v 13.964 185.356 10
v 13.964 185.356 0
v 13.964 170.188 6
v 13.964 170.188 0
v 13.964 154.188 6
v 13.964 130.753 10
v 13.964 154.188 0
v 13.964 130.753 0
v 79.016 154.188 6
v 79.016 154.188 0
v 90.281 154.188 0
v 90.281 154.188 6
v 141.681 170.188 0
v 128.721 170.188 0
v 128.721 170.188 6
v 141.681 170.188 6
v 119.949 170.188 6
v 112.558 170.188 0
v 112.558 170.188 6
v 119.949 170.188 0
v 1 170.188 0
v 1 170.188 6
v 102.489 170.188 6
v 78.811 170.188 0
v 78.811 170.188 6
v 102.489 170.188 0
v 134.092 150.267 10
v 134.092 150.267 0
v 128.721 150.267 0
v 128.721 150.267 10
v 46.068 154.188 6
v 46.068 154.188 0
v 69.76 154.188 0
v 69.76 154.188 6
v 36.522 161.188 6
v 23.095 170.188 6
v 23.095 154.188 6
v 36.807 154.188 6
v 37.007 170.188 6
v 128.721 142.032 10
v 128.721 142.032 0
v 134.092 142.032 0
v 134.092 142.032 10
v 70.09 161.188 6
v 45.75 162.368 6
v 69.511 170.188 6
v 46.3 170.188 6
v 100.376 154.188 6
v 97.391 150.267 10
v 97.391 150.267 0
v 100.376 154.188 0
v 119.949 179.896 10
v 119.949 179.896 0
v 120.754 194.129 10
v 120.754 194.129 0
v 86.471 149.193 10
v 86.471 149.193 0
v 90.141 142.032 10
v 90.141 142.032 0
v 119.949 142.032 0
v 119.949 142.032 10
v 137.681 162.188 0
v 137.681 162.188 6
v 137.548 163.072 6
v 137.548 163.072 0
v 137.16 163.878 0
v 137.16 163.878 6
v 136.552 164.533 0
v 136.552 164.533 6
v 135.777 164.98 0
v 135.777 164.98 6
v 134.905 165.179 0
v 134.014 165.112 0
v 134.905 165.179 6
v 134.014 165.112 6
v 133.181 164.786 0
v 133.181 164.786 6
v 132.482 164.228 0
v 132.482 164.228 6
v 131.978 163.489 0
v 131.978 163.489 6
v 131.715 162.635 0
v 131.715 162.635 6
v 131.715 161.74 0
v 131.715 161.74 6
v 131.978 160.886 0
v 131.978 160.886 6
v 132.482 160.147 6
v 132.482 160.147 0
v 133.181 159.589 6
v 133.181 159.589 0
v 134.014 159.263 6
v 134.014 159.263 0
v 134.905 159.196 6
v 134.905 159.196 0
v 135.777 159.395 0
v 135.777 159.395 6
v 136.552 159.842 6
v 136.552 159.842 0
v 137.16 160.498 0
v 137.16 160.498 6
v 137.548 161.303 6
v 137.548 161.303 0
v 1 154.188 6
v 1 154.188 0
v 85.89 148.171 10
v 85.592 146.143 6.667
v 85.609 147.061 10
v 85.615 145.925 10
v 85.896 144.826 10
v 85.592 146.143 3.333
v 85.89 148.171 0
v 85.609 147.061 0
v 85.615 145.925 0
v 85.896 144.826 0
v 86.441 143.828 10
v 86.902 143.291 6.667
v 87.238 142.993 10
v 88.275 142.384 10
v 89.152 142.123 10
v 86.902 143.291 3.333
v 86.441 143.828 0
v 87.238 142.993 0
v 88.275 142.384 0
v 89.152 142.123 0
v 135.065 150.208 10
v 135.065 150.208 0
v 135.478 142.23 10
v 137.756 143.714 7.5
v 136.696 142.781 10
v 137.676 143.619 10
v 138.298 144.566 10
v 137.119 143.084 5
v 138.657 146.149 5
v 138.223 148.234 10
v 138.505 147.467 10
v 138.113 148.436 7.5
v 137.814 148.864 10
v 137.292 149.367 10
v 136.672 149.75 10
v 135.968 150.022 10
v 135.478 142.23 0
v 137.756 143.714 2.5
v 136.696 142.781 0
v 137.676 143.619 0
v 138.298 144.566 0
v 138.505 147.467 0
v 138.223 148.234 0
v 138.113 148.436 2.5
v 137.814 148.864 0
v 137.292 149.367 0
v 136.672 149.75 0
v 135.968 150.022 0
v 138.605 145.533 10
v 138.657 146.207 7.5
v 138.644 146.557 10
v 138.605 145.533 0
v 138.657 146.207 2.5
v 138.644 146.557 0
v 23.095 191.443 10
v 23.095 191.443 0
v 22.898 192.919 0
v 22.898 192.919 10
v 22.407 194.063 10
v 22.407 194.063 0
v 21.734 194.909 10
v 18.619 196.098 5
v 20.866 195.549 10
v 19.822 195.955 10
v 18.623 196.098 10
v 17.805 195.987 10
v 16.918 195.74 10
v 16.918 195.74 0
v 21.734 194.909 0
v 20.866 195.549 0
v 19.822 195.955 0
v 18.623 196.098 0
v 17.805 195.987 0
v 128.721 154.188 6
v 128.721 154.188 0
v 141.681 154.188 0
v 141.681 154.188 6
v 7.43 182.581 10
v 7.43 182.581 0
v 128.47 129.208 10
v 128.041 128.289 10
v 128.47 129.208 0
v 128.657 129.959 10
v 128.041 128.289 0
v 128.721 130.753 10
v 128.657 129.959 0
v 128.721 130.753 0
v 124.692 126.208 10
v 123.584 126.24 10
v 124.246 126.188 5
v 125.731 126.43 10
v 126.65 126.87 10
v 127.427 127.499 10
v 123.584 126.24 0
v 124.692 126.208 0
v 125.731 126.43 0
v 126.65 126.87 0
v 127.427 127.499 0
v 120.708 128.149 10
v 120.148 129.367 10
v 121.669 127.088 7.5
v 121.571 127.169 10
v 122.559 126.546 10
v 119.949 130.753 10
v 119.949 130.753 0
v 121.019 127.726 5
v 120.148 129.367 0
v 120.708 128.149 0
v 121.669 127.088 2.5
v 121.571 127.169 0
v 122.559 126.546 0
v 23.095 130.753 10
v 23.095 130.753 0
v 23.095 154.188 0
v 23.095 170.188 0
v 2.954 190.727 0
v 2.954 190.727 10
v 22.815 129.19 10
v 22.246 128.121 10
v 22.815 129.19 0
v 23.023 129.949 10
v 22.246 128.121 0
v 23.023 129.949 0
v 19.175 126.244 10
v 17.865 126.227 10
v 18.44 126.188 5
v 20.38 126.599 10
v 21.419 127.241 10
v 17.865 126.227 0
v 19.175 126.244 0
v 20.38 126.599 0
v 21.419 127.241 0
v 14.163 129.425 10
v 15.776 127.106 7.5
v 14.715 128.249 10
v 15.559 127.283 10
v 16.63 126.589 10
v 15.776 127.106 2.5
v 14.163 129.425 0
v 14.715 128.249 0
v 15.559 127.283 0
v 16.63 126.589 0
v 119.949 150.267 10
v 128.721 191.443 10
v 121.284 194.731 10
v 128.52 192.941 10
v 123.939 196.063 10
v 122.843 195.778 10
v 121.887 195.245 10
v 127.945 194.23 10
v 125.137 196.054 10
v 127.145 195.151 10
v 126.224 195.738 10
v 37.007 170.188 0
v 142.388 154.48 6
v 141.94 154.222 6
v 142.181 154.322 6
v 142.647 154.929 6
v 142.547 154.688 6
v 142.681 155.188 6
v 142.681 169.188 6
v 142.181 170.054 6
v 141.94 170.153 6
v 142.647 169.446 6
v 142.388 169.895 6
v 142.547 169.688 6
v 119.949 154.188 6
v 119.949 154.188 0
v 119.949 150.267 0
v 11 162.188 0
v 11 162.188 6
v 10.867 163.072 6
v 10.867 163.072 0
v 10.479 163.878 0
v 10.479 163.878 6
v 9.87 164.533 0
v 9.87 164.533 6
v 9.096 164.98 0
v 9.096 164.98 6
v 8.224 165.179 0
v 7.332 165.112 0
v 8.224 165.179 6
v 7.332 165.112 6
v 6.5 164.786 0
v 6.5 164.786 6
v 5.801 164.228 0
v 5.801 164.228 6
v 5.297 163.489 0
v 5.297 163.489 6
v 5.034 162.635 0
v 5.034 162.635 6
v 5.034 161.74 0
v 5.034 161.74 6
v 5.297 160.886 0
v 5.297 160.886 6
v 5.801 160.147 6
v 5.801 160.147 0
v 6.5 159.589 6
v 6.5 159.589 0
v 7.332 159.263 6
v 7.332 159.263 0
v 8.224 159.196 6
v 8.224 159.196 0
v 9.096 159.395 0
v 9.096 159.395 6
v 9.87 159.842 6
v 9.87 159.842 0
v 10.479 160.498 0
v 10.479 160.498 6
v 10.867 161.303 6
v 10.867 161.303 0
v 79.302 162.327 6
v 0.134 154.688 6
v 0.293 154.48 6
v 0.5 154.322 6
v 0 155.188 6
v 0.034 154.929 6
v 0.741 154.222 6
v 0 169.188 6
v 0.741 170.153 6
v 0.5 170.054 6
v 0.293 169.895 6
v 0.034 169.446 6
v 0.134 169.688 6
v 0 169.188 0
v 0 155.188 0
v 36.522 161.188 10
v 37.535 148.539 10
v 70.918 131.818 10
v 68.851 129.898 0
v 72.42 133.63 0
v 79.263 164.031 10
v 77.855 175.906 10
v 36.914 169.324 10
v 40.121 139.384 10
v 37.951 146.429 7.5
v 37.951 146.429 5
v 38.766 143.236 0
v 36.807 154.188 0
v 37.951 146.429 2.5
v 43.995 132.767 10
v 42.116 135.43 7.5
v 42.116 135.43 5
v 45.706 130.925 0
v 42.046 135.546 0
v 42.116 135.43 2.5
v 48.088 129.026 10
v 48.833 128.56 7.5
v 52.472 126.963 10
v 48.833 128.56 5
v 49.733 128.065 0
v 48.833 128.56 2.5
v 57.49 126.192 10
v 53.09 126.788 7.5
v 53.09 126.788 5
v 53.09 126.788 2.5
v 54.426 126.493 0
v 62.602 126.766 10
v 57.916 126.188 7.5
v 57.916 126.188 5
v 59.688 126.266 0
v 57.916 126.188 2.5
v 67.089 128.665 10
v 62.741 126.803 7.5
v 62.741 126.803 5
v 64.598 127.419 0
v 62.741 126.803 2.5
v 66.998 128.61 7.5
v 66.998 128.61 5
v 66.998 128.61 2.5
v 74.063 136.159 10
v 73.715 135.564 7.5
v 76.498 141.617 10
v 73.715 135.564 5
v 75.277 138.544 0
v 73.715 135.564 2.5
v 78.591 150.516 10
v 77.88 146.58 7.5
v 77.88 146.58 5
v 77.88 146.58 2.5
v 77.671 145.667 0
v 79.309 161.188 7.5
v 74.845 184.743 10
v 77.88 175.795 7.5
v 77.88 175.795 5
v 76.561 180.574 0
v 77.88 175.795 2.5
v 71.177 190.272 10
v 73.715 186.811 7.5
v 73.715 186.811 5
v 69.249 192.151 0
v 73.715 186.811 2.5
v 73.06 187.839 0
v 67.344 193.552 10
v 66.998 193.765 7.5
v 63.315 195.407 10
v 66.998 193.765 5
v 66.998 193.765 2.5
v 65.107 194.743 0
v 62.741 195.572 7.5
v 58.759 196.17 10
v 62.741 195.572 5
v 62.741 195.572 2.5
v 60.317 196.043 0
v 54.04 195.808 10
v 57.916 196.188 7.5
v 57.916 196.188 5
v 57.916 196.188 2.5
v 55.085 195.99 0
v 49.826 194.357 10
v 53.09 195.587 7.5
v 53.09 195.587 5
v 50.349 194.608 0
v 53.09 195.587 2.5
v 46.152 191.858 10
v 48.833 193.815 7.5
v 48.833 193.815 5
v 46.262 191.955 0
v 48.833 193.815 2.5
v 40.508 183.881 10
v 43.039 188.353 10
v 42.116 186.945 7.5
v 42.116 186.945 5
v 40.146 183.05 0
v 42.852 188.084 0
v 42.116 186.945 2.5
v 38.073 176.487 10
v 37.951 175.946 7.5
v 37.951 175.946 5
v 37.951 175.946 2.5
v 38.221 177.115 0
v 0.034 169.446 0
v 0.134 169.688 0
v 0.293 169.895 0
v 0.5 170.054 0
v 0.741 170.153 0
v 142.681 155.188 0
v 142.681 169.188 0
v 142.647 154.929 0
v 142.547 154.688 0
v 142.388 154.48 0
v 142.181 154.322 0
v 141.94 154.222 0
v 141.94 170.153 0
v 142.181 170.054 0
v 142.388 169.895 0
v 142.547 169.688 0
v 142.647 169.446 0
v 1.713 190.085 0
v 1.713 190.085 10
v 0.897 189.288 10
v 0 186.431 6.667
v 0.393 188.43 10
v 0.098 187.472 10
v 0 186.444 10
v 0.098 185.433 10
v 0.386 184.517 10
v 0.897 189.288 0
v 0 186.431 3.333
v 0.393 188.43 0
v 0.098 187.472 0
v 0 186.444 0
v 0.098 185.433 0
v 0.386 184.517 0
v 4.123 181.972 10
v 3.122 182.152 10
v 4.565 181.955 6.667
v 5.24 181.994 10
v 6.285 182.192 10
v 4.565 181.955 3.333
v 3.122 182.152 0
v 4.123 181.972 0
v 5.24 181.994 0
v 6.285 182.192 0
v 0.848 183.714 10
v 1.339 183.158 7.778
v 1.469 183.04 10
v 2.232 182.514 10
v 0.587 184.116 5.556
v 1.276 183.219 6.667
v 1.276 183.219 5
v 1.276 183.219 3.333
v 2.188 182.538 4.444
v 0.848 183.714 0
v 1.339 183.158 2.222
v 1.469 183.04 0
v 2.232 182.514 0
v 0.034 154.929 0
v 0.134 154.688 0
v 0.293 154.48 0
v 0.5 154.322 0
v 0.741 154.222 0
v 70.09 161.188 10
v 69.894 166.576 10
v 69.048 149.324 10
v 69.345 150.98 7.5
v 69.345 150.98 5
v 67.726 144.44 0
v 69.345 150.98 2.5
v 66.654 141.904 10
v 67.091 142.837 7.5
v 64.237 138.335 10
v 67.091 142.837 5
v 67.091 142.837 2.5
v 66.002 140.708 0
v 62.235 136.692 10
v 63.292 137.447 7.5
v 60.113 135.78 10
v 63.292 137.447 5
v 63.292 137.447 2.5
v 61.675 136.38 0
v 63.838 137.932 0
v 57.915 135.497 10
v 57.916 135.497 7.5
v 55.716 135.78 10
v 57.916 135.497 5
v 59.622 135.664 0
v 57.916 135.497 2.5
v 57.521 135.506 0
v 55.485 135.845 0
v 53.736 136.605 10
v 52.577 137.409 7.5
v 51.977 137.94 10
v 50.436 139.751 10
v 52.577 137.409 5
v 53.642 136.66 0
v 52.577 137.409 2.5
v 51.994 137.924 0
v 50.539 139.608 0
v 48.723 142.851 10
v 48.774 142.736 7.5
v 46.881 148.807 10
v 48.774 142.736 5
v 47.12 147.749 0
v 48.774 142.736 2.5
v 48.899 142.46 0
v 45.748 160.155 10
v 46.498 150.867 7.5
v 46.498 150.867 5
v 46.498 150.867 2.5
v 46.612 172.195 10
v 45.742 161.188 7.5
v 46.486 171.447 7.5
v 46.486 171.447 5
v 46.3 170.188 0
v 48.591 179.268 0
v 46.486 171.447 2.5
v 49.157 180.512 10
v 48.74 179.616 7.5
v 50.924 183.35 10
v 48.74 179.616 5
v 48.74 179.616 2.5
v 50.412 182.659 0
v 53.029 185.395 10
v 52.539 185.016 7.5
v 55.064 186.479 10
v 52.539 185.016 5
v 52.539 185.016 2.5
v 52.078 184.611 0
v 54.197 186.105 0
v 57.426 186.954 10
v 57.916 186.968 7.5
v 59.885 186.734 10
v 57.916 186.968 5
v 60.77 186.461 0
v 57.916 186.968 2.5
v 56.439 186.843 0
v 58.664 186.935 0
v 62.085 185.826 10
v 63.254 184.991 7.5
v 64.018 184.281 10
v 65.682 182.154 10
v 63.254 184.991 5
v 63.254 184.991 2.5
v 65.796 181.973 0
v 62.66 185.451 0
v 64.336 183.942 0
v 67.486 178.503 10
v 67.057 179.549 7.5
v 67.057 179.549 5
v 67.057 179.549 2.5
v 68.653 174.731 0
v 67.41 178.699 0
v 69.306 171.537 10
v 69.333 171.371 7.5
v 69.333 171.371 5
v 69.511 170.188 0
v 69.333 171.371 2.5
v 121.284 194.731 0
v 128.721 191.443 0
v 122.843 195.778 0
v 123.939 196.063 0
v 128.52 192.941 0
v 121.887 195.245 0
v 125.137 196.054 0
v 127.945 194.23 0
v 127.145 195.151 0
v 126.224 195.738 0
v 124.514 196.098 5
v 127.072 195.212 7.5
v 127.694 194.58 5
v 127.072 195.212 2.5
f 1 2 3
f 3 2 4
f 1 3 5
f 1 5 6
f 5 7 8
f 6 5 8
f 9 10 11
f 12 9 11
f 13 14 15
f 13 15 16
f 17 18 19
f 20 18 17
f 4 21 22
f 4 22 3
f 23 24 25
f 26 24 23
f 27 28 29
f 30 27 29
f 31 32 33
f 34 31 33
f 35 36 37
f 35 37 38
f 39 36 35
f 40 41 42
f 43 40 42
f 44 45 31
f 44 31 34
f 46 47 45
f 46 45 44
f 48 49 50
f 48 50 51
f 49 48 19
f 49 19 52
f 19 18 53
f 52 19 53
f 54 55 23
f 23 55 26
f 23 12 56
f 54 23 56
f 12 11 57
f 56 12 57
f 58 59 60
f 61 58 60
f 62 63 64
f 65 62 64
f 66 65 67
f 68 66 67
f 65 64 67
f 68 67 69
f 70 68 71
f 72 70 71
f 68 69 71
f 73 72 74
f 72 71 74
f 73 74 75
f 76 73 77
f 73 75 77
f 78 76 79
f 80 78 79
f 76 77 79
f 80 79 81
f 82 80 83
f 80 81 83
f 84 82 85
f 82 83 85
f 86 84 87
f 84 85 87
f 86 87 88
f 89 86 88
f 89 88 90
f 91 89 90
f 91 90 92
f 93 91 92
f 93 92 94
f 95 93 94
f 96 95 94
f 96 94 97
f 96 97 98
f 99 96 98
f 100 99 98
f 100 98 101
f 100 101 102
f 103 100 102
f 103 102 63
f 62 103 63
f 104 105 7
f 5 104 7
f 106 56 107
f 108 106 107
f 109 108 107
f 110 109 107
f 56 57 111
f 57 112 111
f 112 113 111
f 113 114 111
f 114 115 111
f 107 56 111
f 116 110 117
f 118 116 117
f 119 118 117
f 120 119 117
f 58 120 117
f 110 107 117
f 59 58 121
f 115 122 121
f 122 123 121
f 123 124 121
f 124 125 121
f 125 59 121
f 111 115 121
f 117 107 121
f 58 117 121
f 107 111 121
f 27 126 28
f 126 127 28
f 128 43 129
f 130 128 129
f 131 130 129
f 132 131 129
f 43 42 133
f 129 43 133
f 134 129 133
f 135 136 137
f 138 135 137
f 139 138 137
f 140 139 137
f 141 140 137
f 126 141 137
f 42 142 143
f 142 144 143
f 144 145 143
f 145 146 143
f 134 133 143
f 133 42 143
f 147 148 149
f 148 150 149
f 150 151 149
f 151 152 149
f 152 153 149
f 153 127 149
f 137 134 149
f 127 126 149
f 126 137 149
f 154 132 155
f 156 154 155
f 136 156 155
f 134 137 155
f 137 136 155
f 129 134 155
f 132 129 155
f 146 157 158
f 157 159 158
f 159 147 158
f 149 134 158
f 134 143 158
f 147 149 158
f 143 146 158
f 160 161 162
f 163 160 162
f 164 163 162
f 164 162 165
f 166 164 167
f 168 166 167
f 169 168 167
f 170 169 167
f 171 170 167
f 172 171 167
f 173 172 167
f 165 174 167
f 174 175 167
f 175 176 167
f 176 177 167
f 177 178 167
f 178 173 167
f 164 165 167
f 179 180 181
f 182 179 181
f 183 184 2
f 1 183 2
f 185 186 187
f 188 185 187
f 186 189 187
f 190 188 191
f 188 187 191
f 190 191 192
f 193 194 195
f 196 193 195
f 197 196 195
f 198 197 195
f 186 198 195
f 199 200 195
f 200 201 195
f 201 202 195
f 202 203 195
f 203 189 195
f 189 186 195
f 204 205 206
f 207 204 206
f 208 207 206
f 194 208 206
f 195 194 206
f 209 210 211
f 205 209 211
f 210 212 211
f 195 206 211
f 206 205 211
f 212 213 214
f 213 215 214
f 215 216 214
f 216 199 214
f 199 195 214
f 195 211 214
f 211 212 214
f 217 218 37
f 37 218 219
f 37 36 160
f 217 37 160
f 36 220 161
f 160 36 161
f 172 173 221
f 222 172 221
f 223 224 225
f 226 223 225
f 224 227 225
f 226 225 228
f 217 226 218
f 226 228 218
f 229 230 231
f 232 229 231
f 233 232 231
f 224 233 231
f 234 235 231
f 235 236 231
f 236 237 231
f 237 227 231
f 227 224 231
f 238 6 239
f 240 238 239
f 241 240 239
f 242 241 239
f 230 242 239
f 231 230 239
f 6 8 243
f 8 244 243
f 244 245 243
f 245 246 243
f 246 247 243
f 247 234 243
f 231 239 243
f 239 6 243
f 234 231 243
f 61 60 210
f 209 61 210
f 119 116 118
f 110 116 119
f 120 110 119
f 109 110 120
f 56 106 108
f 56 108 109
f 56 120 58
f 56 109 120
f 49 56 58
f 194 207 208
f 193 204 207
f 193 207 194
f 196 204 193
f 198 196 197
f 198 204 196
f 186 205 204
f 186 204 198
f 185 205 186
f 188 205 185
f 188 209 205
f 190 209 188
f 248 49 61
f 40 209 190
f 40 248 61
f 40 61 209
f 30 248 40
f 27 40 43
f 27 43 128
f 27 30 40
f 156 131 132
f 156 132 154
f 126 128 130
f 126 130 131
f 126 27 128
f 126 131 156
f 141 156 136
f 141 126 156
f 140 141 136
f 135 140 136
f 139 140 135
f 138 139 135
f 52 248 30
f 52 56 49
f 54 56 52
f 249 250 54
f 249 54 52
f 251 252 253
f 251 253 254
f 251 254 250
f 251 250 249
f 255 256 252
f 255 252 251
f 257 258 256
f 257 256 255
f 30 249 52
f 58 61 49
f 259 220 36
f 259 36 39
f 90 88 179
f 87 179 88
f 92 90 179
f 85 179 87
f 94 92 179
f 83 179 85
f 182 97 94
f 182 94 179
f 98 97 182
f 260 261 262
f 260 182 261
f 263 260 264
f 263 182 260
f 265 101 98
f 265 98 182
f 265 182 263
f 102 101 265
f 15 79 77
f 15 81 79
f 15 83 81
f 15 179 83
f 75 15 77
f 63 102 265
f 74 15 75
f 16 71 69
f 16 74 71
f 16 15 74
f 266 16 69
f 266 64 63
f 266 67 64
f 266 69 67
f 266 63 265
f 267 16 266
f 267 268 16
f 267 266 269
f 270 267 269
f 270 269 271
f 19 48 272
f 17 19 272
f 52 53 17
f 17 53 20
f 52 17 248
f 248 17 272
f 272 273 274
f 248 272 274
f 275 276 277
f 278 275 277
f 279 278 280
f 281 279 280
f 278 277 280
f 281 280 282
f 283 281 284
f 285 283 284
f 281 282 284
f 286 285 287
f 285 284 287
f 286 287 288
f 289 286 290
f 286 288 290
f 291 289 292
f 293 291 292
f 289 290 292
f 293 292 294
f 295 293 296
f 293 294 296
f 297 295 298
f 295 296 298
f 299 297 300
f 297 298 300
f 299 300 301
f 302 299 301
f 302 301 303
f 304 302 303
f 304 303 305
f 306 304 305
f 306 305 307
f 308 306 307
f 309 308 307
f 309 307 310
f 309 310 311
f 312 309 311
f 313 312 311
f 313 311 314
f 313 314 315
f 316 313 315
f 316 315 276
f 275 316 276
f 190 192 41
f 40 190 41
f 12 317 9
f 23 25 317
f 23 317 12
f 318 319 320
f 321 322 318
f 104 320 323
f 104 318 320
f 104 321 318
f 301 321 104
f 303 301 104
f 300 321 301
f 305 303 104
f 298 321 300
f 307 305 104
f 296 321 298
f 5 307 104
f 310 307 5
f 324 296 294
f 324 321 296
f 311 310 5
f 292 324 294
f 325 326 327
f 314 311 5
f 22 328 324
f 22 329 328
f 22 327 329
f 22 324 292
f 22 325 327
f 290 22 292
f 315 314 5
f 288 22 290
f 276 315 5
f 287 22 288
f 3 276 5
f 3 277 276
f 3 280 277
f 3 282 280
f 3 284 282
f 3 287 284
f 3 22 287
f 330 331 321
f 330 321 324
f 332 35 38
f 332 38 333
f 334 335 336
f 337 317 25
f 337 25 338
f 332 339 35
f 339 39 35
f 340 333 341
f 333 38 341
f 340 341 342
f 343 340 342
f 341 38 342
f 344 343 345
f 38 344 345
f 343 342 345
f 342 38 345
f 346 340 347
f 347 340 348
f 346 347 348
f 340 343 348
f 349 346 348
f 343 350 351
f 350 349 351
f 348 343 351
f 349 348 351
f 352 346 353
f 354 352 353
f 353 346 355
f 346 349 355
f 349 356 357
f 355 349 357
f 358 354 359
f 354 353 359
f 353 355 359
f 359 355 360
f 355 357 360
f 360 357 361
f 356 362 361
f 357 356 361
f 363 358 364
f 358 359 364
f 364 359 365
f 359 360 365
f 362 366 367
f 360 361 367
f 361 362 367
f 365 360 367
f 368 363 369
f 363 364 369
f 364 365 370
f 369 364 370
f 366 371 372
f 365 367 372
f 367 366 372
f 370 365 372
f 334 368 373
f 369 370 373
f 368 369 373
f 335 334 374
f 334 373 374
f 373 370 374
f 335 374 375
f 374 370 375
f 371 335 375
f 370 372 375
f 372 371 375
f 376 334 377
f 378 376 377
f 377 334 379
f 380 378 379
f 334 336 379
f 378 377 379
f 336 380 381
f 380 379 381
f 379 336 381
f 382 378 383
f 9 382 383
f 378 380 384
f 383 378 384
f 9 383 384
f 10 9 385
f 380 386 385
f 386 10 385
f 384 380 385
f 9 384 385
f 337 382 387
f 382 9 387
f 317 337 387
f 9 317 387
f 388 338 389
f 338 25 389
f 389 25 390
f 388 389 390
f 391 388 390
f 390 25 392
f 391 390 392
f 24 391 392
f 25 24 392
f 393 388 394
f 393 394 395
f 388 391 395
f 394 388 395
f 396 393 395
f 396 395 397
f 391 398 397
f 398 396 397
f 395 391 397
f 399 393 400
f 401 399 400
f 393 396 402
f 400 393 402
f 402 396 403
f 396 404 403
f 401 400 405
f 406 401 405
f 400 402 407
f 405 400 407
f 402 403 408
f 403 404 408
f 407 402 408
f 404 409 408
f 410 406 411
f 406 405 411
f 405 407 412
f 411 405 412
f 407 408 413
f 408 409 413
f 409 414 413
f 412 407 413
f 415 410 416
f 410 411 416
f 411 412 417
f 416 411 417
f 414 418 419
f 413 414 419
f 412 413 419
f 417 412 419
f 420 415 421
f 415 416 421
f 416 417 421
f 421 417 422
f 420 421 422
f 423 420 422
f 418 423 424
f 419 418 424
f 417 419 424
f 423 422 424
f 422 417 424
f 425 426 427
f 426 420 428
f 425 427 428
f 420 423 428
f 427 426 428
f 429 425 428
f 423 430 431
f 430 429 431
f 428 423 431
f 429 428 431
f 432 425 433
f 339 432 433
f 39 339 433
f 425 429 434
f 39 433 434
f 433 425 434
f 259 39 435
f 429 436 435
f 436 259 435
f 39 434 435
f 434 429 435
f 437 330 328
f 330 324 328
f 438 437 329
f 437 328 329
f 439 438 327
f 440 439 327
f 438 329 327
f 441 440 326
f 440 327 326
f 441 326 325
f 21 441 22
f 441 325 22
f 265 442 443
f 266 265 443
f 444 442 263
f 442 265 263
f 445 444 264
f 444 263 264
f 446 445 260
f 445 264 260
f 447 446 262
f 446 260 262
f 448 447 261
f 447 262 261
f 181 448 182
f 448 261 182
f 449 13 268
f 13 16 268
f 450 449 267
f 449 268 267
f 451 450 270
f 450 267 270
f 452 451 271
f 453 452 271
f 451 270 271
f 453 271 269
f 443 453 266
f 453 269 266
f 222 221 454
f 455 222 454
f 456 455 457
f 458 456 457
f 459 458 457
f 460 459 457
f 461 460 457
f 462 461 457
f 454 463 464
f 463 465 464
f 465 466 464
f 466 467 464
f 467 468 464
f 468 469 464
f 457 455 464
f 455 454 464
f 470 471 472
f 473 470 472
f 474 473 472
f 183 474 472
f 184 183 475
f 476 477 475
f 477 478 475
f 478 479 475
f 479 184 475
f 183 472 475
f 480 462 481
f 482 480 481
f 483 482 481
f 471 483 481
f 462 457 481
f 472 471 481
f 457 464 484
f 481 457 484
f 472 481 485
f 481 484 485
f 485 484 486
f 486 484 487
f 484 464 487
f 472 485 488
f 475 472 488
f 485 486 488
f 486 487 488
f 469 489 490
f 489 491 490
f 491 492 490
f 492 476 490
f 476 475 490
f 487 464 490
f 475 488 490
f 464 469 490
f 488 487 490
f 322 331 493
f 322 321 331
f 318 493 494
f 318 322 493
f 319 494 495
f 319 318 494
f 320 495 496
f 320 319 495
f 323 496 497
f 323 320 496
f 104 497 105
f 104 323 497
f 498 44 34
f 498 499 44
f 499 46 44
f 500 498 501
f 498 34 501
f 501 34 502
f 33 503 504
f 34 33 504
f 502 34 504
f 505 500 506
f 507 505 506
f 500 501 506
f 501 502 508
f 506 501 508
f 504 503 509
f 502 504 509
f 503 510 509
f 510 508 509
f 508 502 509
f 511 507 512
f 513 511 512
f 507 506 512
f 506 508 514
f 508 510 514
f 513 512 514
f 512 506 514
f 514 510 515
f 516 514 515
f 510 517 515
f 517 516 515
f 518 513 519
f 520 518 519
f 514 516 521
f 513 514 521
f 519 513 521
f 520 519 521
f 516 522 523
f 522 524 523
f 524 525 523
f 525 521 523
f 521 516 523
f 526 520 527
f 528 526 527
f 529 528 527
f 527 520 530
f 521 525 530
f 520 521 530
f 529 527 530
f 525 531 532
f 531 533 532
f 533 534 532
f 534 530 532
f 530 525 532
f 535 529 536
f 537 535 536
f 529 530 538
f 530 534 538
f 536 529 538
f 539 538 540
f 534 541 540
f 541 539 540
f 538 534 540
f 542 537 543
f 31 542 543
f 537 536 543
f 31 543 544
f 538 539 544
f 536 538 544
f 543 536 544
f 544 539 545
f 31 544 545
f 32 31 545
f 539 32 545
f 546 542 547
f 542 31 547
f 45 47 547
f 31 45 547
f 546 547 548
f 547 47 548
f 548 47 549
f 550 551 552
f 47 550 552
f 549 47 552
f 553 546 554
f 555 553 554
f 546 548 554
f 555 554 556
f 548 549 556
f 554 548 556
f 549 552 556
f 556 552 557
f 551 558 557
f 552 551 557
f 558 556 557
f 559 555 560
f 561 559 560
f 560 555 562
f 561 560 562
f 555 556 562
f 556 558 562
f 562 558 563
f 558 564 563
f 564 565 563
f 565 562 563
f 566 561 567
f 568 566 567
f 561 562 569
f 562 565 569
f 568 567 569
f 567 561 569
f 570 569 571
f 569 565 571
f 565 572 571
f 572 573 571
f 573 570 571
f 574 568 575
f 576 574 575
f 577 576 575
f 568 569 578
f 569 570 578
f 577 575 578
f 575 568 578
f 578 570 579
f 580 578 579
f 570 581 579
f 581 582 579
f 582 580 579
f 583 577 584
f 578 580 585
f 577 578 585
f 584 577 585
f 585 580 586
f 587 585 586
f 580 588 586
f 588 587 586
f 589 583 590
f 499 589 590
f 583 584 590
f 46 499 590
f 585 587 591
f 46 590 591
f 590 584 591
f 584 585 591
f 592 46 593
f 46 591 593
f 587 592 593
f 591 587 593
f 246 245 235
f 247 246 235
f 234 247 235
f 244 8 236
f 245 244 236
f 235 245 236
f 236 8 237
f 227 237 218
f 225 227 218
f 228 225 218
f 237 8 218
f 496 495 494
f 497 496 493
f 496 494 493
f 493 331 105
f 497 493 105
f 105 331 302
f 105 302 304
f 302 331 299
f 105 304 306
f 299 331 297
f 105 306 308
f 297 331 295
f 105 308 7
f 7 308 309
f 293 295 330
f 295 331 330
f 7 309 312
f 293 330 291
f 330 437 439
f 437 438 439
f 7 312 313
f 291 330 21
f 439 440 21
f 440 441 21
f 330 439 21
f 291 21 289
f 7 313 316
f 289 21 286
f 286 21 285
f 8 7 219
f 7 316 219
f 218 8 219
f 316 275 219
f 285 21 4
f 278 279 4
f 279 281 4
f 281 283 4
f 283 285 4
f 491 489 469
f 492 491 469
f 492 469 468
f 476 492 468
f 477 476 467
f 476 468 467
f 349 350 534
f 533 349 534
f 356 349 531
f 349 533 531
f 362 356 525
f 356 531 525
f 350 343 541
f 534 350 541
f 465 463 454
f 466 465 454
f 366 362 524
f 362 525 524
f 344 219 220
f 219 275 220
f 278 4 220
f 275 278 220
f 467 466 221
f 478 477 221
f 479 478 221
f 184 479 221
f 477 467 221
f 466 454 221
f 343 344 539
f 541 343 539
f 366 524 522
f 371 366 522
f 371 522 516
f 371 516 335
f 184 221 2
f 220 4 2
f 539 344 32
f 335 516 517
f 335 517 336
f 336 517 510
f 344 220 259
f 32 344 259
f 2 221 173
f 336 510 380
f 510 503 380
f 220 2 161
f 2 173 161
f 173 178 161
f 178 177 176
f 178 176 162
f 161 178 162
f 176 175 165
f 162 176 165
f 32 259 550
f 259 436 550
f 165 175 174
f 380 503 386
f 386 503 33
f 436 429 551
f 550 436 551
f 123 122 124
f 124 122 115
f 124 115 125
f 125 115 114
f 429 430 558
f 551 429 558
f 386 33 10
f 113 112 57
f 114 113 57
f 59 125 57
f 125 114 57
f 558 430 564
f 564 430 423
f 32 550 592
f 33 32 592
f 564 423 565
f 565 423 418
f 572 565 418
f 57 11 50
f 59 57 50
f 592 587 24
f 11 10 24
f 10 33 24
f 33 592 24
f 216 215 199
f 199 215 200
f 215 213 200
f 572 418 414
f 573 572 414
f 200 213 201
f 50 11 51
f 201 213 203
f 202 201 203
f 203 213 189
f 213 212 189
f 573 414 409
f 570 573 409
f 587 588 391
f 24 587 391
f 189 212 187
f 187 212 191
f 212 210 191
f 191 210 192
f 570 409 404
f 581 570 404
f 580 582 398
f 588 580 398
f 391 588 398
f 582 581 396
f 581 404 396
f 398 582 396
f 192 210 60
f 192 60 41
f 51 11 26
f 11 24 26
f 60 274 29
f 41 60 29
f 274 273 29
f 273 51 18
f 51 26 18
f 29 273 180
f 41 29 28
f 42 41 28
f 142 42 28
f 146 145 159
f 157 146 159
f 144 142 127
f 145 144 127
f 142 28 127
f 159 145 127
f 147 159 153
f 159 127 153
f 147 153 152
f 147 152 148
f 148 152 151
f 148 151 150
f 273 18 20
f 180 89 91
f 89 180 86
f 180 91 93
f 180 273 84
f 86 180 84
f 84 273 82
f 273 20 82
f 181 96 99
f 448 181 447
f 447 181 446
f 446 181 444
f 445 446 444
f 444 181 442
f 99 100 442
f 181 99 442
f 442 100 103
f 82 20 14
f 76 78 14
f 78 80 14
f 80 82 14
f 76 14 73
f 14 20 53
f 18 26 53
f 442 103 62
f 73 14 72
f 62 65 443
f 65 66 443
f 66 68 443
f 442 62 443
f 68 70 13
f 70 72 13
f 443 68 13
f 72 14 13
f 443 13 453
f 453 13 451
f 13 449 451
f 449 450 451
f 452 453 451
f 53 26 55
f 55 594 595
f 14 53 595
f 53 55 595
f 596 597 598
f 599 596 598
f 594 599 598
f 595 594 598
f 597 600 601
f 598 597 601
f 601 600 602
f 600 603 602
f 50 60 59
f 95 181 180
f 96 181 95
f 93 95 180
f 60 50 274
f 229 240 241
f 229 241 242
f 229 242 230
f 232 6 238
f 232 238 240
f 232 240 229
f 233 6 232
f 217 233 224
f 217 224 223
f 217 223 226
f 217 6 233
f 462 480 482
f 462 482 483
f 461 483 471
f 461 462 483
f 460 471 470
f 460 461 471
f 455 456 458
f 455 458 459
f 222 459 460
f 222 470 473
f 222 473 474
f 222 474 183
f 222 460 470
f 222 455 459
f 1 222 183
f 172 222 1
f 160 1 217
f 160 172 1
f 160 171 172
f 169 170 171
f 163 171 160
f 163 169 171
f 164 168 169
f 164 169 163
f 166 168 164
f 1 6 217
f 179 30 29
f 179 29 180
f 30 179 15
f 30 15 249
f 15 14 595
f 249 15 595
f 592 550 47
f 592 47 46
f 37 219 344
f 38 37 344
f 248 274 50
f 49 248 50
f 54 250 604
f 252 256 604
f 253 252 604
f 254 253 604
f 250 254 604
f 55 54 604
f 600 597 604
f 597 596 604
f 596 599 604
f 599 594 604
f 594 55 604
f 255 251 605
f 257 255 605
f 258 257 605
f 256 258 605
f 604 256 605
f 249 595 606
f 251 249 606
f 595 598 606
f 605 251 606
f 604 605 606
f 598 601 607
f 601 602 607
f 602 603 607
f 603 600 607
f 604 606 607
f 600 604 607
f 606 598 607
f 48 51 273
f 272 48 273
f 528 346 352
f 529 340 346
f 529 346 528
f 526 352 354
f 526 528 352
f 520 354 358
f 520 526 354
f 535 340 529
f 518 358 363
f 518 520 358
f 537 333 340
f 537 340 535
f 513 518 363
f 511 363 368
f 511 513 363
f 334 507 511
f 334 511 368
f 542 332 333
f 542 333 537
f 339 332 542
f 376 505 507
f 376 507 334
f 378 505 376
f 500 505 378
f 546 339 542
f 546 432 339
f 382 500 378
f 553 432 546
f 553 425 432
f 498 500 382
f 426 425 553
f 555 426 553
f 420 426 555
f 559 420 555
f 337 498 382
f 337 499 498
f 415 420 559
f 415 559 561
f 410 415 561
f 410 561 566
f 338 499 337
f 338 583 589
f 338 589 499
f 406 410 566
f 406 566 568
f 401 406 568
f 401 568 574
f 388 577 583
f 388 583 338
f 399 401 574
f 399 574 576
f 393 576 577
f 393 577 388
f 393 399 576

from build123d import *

# Parameters (mm, degrees)
PAD_DEPTH    = 10
SKETCH001_W  = 142.681204
SKETCH001_H  = 16
PAD001_DEPTH = 6
SKETCH002_R  = 3
POCKET_DEPTH = 6.001
FILLET_R     = 1


with BuildPart() as part:
    # Sketch (on XY_Plane of Origin) → Pad (new body)
    with BuildSketch(Plane.XY):
        with BuildLine():
            add(Edge.make_bspline(
                [(18.439902, 126.187558), (21.035809, 126.187558), (23.094632, 128.246381), (23.094632, 130.752774)],
                knots=[0, 0, 0, 0, 1, 1, 1, 1], degree=3))
            Line((23.094632, 130.752774), (23.094632, 191.443296))
            add(Edge.make_bspline(
                [(23.094632, 191.443296), (23.094632, 194.128717), (21.304351, 196.098026), (18.61893, 196.098026)],
                knots=[0, 0, 0, 0, 1, 1, 1, 1], degree=3))
            add(Edge.make_bspline(
                [(18.61893, 196.098026), (18.17136, 196.098026), (17.455247, 195.918998), (16.918163, 195.73997)],
                knots=[0, 0, 0, 0, 1, 1, 1, 1], degree=3))
            Line((16.918163, 195.73997), (2.953972, 190.727184))
            add(Edge.make_bspline(
                [(2.953972, 190.727184), (0.895149, 190.011071), (9e-06, 188.310304), (9e-06, 186.430509)],
                knots=[0, 0, 0, 0, 1, 1, 1, 1], degree=3))
            add(Edge.make_bspline(
                [(9e-06, 186.430509), (9e-06, 183.834602), (1.879804, 181.954807), (4.565225, 181.954807)],
                knots=[0, 0, 0, 0, 1, 1, 1, 1], degree=3))
            add(Edge.make_bspline(
                [(4.565225, 181.954807), (5.370852, 181.954807), (6.355506, 182.133835), (7.429675, 182.581406)],
                knots=[0, 0, 0, 0, 1, 1, 1, 1], degree=3))
            Line((7.429675, 182.581406), (13.9642, 185.356341))
            Line((13.9642, 185.356341), (13.9642, 130.752774))
            add(Edge.make_bspline(
                [(13.9642, 130.752774), (13.9642, 128.246381), (16.023023, 126.187558), (18.439902, 126.187558)],
                knots=[0, 0, 0, 0, 1, 1, 1, 1], degree=3))
        make_face()
        with BuildLine():
            add(Edge.make_bspline(
                [(57.915595, 126.187558), (71.52173, 126.187558), (79.309452, 139.525151), (79.309452, 161.187549)],
                knots=[0, 0, 0, 0, 1, 1, 1, 1], degree=3))
            add(Edge.make_bspline(
                [(79.309452, 161.187549), (79.309452, 182.849948), (71.52173, 196.18754), (57.915595, 196.18754)],
                knots=[0, 0, 0, 0, 1, 1, 1, 1], degree=3))
            add(Edge.make_bspline(
                [(57.915595, 196.18754), (44.309461, 196.18754), (36.521739, 183.208004), (36.521739, 161.187549)],
                knots=[0, 0, 0, 0, 1, 1, 1, 1], degree=3))
            add(Edge.make_bspline(
                [(36.521739, 161.187549), (36.521739, 139.167094), (44.309461, 126.187558), (57.915595, 126.187558)],
                knots=[0, 0, 0, 0, 1, 1, 1, 1], degree=3))
        make_face()
        with BuildLine():
            add(Edge.make_bspline(
                [(57.915595, 135.497019), (49.769817, 135.497019), (45.741685, 146.238704), (45.741685, 161.187549)],
                knots=[0, 0, 0, 0, 1, 1, 1, 1], degree=3))
            add(Edge.make_bspline(
                [(45.741685, 161.187549), (45.741685, 175.957366), (49.680303, 186.967594), (57.915595, 186.967594)],
                knots=[0, 0, 0, 0, 1, 1, 1, 1], degree=3))
            add(Edge.make_bspline(
                [(57.915595, 186.967594), (66.061373, 186.967594), (70.089505, 175.778338), (70.089505, 161.187549)],
                knots=[0, 0, 0, 0, 1, 1, 1, 1], degree=3))
            add(Edge.make_bspline(
                [(70.089505, 161.187549), (70.089505, 146.507246), (66.150887, 135.497019), (57.915595, 135.497019)],
                knots=[0, 0, 0, 0, 1, 1, 1, 1], degree=3))
        make_face(mode=Mode.SUBTRACT)
        with BuildLine():
            add(Edge.make_bspline(
                [(124.245501, 126.187558), (126.841409, 126.187558), (128.721204, 128.246381), (128.721204, 130.752774)],
                knots=[0, 0, 0, 0, 1, 1, 1, 1], degree=3))
            Line((128.721204, 130.752774), (128.721204, 142.031544))
            Line((128.721204, 142.031544), (134.092046, 142.031544))
            add(Edge.make_bspline(
                [(134.092046, 142.031544), (136.598439, 142.031544), (138.657262, 143.911339), (138.657262, 146.14919)],
                knots=[0, 0, 0, 0, 1, 1, 1, 1], degree=3))
            add(Edge.make_bspline(
                [(138.657262, 146.14919), (138.657262, 149.192667), (136.598439, 150.266836), (134.092046, 150.266836)],
                knots=[0, 0, 0, 0, 1, 1, 1, 1], degree=3))
            Line((134.092046, 150.266836), (128.721204, 150.266836))
            Line((128.721204, 150.266836), (128.721204, 191.443296))
            add(Edge.make_bspline(
                [(128.721204, 191.443296), (128.721204, 194.039203), (127.020437, 196.098026), (124.514044, 196.098026)],
                knots=[0, 0, 0, 0, 1, 1, 1, 1], degree=3))
            add(Edge.make_bspline(
                [(124.514044, 196.098026), (122.902791, 196.098026), (121.649594, 195.2924), (120.754454, 194.128717)],
                knots=[0, 0, 0, 0, 1, 1, 1, 1], degree=3))
            Line((120.754454, 194.128717), (86.470575, 149.192667))
            add(Edge.make_bspline(
                [(86.470575, 149.192667), (84.411752, 146.507246), (86.023005, 142.031544), (90.140651, 142.031544)],
                knots=[0, 0, 0, 0, 1, 1, 1, 1], degree=3))
            Line((90.140651, 142.031544), (119.948827, 142.031544))
            Line((119.948827, 142.031544), (119.948827, 130.752774))
            add(Edge.make_bspline(
                [(119.948827, 130.752774), (119.948827, 128.246381), (121.828622, 126.187558), (124.245501, 126.187558)],
                knots=[0, 0, 0, 0, 1, 1, 1, 1], degree=3))
        make_face()
        Polygon((119.948827, 150.266836), (97.391288, 150.266836), (119.948827, 179.895984), align=None, mode=Mode.SUBTRACT)
    extrude(amount=PAD_DEPTH)

    # Sketch001 (on XY_Plane of Origin) → Pad001 (join)
    with BuildSketch(Plane.XY):
        with Locations((71.340602, 162.187558)):
            Rectangle(SKETCH001_W, SKETCH001_H)
    extrude(amount=PAD001_DEPTH)

    # Sketch002 (on Face26 of Pad001) → Pocket (cut, through all)
    with BuildSketch(Plane.XY.offset(6)):
        with Locations((8, 162.187558)):
            Circle(SKETCH002_R)
        with Locations((134.681204, 162.187558)):
            Circle(SKETCH002_R)
    extrude(amount=-POCKET_DEPTH, mode=Mode.SUBTRACT)

    # Fillet
    fillet_edges = [part.edges().sort_by_distance(p)[0] for p in [
        (142.681204, 170.187558, 3),
        (142.681204, 154.187558, 3),
        (0, 170.187558, 3),
        (0, 154.187558, 3),
    ]]
    fillet(fillet_edges, radius=FILLET_R)


solid = part.part
